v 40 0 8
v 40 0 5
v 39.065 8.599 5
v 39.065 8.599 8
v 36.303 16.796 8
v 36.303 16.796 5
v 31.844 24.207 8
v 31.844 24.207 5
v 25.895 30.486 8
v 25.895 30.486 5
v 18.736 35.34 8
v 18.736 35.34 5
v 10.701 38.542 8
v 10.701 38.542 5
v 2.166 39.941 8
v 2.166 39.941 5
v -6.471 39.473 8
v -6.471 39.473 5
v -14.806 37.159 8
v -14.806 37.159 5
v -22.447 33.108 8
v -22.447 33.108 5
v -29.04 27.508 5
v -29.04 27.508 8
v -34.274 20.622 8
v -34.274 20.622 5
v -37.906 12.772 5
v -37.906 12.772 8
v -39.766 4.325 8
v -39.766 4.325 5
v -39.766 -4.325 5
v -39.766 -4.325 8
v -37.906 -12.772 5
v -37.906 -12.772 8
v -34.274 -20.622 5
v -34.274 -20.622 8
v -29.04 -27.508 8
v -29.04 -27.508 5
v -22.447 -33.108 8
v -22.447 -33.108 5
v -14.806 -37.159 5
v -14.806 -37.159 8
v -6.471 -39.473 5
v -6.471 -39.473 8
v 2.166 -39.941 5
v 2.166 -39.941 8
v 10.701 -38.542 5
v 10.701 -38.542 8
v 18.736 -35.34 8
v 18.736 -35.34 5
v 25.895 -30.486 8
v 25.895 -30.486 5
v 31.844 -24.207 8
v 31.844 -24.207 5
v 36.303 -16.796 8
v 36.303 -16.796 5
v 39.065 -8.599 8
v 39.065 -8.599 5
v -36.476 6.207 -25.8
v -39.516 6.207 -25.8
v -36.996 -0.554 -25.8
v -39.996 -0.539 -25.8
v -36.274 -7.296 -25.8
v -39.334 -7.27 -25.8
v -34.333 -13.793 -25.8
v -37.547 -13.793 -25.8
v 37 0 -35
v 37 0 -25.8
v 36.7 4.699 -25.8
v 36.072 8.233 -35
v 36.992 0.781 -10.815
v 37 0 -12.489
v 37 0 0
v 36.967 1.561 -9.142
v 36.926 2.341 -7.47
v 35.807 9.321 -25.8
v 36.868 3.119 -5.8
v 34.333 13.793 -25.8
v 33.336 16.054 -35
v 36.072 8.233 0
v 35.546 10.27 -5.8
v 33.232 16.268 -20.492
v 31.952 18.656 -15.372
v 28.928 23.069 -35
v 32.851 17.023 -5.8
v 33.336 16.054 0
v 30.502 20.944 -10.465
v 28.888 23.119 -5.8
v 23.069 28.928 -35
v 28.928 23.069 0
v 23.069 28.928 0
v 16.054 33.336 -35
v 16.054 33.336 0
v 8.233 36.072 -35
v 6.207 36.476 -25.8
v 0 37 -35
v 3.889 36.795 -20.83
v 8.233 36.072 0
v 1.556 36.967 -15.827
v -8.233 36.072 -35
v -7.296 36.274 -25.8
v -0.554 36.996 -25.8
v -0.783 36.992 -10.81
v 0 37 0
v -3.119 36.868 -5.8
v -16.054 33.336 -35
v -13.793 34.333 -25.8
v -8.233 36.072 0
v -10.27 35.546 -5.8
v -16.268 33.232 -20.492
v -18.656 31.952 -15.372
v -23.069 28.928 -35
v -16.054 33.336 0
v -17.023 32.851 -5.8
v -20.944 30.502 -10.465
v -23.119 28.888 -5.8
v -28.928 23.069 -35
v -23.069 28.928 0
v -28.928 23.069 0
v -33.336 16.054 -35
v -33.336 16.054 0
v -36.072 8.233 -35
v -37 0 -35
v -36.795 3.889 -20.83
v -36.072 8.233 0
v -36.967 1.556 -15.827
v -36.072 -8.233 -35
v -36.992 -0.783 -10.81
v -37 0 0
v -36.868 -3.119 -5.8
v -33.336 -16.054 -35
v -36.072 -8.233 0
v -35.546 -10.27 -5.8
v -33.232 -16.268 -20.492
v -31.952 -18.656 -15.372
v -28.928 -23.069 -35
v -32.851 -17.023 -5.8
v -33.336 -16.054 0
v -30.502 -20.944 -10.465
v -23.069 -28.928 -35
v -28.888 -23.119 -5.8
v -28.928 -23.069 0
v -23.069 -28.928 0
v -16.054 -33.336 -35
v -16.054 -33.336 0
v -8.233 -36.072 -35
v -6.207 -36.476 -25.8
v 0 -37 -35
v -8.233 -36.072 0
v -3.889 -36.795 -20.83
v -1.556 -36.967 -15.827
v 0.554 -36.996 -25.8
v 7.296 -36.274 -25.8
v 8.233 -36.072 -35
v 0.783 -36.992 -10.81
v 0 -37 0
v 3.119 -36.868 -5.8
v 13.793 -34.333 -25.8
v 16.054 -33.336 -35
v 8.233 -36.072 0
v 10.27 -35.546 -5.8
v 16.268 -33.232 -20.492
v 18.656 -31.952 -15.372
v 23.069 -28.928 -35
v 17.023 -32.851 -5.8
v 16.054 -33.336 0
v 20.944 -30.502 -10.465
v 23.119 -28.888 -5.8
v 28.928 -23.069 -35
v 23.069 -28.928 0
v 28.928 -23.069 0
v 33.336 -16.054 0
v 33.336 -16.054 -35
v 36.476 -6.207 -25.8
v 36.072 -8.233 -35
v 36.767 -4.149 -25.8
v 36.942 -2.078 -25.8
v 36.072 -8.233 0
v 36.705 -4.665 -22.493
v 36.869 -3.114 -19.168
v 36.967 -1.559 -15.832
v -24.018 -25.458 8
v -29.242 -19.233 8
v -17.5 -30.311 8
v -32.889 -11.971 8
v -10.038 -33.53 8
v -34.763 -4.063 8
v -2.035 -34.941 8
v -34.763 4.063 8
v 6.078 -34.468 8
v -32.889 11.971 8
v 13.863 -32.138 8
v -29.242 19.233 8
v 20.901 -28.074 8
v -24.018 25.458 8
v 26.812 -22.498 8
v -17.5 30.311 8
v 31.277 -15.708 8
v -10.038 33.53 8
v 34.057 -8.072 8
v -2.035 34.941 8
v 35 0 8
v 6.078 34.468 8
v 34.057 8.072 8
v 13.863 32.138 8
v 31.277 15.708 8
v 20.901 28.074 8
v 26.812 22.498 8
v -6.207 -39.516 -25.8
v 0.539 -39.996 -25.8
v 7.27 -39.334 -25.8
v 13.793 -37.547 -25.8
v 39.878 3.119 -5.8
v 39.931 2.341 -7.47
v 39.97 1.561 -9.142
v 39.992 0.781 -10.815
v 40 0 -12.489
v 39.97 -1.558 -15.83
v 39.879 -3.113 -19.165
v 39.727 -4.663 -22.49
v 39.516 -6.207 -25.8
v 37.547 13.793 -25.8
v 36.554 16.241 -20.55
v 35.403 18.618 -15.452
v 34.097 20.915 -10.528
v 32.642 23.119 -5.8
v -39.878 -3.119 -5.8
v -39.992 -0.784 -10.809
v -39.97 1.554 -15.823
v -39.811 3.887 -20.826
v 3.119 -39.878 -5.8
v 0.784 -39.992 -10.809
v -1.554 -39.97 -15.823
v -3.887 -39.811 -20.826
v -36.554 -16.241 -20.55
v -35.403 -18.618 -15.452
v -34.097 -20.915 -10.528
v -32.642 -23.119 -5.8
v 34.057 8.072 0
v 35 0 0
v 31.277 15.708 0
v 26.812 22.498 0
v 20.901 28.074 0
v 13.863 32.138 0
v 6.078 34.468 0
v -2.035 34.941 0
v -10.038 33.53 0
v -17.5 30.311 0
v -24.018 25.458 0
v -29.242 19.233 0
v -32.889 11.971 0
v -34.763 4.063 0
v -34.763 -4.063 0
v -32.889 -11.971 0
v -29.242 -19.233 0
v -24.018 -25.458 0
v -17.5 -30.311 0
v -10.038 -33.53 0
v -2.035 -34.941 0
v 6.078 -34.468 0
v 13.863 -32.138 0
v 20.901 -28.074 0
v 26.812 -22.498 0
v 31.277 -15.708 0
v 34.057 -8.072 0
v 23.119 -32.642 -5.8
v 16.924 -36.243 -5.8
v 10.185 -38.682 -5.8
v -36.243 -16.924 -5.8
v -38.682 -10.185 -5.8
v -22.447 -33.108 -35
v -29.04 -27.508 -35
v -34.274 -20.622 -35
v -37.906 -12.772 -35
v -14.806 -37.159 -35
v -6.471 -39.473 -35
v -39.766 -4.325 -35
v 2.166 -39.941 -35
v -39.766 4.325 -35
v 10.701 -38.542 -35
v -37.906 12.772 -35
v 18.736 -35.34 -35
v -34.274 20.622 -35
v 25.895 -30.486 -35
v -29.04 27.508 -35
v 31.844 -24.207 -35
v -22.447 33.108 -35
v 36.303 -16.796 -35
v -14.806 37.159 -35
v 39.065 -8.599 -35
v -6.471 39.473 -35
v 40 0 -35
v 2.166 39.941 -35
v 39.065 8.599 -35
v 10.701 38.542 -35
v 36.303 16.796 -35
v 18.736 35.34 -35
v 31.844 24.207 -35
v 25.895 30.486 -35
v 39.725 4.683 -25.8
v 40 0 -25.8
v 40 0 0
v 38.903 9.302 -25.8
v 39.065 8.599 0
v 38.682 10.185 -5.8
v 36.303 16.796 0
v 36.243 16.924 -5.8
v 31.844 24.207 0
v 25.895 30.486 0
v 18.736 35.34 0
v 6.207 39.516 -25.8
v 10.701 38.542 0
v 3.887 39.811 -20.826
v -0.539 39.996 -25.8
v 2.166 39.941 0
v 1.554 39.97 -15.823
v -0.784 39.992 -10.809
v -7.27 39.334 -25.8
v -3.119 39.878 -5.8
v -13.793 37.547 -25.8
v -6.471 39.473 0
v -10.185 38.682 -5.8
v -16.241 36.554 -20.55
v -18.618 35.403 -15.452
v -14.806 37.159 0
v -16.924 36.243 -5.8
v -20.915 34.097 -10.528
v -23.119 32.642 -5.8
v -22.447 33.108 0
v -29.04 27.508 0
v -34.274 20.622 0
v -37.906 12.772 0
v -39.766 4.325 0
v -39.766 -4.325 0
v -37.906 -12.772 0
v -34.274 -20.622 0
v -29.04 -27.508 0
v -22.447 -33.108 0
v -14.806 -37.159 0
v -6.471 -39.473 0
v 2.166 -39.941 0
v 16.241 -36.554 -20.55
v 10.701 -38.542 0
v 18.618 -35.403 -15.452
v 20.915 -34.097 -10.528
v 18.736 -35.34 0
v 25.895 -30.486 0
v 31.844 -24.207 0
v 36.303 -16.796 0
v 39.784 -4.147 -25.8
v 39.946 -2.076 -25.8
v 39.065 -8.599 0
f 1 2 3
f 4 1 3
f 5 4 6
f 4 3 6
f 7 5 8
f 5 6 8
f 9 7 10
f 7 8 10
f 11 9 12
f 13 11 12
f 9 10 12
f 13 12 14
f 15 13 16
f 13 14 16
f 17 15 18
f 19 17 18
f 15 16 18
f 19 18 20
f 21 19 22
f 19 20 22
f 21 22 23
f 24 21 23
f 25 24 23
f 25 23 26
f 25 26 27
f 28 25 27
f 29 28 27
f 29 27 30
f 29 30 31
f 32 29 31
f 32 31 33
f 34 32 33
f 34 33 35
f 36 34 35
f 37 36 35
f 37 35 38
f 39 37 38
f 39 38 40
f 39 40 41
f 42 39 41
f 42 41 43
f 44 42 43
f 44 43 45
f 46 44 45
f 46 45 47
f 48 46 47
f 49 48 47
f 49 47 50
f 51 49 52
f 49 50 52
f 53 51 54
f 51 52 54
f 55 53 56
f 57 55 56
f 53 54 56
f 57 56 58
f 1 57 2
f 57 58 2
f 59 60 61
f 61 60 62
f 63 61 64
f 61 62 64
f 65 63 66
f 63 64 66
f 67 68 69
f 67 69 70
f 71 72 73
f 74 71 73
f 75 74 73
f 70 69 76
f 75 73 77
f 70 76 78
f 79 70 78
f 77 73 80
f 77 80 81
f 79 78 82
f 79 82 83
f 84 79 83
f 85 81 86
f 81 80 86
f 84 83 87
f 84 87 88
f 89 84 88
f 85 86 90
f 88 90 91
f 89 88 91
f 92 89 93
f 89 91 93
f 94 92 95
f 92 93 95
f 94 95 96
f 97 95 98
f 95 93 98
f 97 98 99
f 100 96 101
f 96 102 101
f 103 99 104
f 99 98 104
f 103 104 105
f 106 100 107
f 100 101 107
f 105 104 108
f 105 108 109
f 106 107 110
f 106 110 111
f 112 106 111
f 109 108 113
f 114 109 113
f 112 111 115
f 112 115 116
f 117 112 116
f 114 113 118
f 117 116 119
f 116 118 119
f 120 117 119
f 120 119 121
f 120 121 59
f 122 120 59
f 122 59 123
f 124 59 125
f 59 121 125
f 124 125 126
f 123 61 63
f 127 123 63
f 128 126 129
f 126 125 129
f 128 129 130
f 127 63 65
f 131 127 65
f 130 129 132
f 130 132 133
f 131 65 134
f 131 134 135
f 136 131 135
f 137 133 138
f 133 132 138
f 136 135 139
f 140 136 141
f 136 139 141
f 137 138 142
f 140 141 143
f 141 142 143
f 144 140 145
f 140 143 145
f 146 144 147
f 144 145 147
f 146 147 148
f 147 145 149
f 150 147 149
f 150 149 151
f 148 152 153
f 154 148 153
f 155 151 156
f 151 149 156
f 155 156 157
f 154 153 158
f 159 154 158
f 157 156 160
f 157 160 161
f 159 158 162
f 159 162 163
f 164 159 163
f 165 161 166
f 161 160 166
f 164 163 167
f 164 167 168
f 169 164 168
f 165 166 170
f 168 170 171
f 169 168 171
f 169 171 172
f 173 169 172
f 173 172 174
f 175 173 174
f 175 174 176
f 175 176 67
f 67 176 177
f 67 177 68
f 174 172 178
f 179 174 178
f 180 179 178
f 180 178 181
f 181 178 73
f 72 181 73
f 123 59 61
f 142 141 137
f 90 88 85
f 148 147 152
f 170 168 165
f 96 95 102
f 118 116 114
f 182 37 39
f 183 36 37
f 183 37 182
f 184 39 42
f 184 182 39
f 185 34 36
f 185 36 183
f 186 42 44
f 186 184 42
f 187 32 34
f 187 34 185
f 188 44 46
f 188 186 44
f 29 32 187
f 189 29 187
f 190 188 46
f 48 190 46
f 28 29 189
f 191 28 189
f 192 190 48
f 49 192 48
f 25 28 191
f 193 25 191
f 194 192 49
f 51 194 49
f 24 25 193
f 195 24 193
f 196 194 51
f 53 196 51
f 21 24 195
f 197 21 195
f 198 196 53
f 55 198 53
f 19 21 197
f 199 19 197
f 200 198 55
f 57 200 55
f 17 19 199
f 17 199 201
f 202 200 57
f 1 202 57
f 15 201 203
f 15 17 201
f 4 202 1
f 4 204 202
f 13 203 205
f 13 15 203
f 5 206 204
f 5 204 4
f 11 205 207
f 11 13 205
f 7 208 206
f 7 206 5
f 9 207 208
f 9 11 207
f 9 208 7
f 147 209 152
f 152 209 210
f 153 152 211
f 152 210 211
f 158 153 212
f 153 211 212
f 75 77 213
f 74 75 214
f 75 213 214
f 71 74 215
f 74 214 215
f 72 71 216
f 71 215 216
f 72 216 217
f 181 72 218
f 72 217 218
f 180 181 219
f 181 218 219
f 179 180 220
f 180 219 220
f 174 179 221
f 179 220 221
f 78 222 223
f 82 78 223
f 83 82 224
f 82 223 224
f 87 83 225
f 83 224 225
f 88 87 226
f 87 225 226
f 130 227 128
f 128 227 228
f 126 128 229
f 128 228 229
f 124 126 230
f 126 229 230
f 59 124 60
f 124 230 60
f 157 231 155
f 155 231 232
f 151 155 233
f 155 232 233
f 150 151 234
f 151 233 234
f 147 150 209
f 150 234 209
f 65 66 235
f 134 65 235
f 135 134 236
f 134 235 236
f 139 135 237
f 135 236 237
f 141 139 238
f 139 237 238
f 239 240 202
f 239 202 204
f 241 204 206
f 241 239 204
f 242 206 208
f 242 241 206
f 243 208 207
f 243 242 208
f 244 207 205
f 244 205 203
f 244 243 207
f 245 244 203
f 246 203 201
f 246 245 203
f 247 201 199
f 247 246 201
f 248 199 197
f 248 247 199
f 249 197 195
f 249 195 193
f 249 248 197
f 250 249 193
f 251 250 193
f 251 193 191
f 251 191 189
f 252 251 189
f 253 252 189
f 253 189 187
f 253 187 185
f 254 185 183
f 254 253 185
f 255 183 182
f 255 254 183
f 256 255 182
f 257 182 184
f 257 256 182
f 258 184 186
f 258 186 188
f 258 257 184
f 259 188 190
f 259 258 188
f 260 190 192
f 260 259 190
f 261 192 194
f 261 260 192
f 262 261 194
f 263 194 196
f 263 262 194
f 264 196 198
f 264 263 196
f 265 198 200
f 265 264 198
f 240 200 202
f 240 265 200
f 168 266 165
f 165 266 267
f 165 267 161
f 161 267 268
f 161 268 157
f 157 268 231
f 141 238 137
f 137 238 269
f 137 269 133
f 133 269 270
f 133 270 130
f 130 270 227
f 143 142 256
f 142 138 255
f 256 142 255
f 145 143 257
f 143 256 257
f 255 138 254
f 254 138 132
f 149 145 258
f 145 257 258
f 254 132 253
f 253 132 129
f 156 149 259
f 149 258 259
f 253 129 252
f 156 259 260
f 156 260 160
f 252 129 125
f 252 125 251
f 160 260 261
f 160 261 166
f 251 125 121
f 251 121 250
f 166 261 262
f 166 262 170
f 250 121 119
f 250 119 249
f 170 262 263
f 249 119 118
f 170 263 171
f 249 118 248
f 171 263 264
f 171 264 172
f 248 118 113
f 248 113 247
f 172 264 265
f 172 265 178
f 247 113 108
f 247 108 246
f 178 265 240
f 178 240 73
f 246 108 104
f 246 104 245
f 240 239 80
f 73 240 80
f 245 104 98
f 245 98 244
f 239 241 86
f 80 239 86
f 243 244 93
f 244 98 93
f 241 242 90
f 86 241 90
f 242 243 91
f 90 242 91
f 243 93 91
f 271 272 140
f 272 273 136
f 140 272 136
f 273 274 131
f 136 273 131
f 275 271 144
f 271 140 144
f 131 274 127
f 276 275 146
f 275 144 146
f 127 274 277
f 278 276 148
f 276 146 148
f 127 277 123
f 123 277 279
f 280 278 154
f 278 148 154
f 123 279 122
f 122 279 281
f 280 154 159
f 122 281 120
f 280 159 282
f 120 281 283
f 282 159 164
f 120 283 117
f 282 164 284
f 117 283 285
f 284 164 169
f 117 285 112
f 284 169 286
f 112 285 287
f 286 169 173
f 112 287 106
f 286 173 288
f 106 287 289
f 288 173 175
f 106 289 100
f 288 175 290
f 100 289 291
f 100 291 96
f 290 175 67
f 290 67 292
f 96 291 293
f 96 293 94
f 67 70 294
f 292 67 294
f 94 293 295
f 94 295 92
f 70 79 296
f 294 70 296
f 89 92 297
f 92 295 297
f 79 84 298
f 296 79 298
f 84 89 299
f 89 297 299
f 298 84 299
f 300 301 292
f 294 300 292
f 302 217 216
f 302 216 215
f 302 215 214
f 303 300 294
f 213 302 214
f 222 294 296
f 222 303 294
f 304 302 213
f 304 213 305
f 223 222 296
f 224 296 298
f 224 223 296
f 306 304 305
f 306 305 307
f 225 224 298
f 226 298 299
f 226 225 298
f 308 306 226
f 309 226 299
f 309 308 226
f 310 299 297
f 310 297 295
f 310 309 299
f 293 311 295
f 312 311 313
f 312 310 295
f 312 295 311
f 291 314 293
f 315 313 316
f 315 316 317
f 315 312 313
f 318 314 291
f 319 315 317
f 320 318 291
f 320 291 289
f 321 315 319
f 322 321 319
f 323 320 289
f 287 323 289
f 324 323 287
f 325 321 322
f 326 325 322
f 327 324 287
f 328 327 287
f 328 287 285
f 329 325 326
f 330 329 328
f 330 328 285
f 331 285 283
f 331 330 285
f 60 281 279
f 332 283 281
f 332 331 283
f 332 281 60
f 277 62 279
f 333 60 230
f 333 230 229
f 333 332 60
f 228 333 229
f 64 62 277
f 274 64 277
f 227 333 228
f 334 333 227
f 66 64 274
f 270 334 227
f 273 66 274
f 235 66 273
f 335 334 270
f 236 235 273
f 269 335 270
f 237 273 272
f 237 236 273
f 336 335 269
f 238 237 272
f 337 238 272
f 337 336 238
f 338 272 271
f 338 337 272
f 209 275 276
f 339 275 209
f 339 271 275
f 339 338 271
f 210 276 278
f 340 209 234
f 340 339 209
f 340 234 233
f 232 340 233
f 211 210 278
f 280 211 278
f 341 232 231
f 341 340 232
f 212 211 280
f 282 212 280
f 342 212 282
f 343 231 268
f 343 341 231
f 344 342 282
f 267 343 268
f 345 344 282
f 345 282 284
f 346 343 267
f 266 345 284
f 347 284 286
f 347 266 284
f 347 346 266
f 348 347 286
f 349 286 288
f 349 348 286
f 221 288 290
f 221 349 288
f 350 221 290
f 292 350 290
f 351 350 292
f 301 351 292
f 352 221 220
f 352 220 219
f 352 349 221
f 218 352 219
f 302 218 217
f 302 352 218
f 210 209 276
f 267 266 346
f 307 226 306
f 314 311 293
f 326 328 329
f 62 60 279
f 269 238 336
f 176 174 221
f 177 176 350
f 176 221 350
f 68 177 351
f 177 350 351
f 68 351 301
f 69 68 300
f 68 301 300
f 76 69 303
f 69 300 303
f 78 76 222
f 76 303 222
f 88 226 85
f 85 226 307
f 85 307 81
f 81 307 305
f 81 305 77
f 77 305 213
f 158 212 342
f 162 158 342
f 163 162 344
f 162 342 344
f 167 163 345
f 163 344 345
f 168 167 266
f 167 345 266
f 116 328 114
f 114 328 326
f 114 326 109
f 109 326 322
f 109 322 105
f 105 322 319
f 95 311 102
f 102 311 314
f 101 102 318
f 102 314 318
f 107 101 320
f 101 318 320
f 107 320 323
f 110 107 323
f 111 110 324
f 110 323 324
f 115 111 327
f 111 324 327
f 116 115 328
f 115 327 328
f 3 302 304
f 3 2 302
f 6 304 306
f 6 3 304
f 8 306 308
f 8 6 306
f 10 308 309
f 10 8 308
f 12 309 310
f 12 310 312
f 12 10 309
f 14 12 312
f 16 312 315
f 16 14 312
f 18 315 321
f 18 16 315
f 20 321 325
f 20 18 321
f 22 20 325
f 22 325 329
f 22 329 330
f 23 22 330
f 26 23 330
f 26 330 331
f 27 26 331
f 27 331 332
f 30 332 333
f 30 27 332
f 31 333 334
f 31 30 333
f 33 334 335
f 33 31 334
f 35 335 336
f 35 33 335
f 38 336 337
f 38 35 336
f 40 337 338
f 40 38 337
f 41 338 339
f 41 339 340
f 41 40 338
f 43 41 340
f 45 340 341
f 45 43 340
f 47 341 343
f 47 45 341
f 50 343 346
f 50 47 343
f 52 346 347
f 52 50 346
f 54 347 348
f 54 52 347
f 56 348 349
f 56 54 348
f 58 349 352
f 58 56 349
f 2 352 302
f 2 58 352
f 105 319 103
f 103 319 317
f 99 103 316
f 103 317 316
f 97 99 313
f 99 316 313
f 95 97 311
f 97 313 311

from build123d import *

# Parameters (mm, degrees)
F0_R     = 40
F0_R_2   = 37
F1_DEPTH = 5
F2_DEPTH = 35
F3_R     = 40
F3_R_2   = 35
F4_DEPTH = 8
F7_DEPTH = 35
F9_COUNT = 4


with BuildPart() as f1:
    # F0 (on Top) → F1 (new body)
    with BuildSketch(Plane.XY):
        Circle(F0_R)
        Circle(F0_R_2, mode=Mode.SUBTRACT)
    extrude(amount=F1_DEPTH)

    # F0 (on Top) → F2 (join)
    with BuildSketch(Plane.XY):
        Circle(F0_R)
        Circle(F0_R_2, mode=Mode.SUBTRACT)
    extrude(amount=-F2_DEPTH)

    # F3 (on Top) → F4 (join)
    with BuildSketch(Plane.XY):
        Circle(F3_R)
        Circle(F3_R_2, mode=Mode.SUBTRACT)
    extrude(amount=F4_DEPTH)

    # F9: F7 ×4 about axis
    f9_axis = Axis((0, 0, -20.4015299678), (0, 0, -1))


with BuildPart() as f7:
    # F6 (on offset) → F7 (new body)
    with BuildSketch(Plane.XZ.offset(50)):
        Polygon((3.1193340375, -5.8), (-6.2068191256, -25.8), (13.7931808744, -25.8), (23.1193340375, -5.8), align=None)
    extrude(amount=-F7_DEPTH)


with BuildPart() as f1_1:
    add(f1.part)
    for i in range(1, F9_COUNT):
        add(f7.part.rotate(f9_axis, i * 360 / F9_COUNT), mode=Mode.SUBTRACT)

    # F9#seed: cut F7
    add(f7.part, mode=Mode.SUBTRACT)


solid = f1_1.part
